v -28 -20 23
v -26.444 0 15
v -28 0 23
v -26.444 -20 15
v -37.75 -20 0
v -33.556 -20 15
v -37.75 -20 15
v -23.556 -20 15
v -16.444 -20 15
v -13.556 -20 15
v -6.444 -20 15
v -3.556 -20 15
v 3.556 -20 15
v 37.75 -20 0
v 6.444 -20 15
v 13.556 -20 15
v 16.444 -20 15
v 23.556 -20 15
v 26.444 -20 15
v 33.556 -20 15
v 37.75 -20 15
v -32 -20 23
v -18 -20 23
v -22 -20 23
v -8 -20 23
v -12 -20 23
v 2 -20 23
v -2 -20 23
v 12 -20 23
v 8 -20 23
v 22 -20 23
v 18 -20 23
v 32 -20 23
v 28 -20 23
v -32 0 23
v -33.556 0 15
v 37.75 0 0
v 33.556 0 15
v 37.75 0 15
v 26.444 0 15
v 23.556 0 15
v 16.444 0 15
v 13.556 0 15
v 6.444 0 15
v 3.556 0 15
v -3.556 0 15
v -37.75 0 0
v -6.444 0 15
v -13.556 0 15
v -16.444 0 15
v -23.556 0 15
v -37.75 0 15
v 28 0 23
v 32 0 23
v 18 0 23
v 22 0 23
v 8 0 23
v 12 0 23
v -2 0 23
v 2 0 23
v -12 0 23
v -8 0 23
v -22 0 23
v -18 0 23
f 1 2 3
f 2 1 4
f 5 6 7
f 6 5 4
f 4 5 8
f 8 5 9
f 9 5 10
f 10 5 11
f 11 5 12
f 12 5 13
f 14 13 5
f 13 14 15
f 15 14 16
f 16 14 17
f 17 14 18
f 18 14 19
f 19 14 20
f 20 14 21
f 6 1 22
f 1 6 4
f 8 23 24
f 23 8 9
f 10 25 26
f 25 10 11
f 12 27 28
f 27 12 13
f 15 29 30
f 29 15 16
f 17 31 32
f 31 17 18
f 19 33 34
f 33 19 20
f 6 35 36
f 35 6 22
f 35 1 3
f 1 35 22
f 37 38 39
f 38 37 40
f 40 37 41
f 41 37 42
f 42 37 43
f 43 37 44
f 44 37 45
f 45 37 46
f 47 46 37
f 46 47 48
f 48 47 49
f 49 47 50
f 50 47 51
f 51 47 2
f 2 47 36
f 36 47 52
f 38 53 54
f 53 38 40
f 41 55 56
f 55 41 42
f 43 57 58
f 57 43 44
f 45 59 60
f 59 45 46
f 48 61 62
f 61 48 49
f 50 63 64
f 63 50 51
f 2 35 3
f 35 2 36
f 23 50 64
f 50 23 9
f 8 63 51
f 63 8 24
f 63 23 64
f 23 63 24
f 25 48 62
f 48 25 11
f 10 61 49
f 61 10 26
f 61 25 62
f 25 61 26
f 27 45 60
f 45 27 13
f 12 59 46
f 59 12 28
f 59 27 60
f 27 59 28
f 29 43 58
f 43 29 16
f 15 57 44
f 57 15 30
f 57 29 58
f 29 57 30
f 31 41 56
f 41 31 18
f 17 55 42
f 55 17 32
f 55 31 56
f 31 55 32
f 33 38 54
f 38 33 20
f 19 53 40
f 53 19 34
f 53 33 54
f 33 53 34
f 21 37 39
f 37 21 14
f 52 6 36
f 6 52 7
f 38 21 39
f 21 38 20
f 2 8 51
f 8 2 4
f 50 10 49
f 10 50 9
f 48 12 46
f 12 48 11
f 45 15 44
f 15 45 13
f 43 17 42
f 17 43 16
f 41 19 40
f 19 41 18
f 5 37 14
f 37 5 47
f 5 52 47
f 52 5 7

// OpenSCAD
$fn = 32;

// ----------------------------------------------------------------------
// Toothed rack, 7 teeth
// 10 mm pitch, 8 mm teeth
// ----------------------------------------------------------------------

// --- parameters (mm) ---
bar_w = 20;    // bar width (Y)
bar_h = 15;    // bar height (Z)
teeth = 7;     // number of teeth
pitch = 10;    // tooth pitch
tooth_h = 8;   // tooth height above the bar
root_w = 7.5;  // tooth width at the root
crest_w = 4;   // tooth width at the crest

// --- derived feature positions (mm) ---
span = (teeth - 1) * pitch;  // = 60   distance between the outer teeth
bar_l = span + root_w + 8;   // = 75.5   bar length: teeth plus 4 mm at each end
tooth_x = -span / 2;         // = -30   X of the first tooth
height = bar_h + tooth_h;    // = 23   overall height
feature_centers = [
  [tooth_x + 0 * pitch, -bar_w / 2],
  [tooth_x + 1 * pitch, -bar_w / 2],
  [tooth_x + 2 * pitch, -bar_w / 2],
  [tooth_x + 3 * pitch, -bar_w / 2],
  [tooth_x + 4 * pitch, -bar_w / 2],
  [tooth_x + 5 * pitch, -bar_w / 2],
  [tooth_x + 6 * pitch, -bar_w / 2]
];   // tooth centre line, drives the tooth loop

// bar with a rack of teeth, one extruded trapezoium per centre
module rack_tooth() {
  linear_extrude(height = bar_w)
    polygon(points = [
      [0, 0],
      [root_w, 0],
      [root_w / 2 + crest_w / 2, tooth_h + 1],
      [root_w / 2 - crest_w / 2, tooth_h + 1]
    ]);
}

union() {
  translate([-bar_l / 2, -bar_w, 0]) cube([bar_l, bar_w, bar_h]);
  for (centre = feature_centers)
    translate([centre[0] - root_w / 2, 0, bar_h - 1]) rotate([90, 0, 0]) rack_tooth();
}
